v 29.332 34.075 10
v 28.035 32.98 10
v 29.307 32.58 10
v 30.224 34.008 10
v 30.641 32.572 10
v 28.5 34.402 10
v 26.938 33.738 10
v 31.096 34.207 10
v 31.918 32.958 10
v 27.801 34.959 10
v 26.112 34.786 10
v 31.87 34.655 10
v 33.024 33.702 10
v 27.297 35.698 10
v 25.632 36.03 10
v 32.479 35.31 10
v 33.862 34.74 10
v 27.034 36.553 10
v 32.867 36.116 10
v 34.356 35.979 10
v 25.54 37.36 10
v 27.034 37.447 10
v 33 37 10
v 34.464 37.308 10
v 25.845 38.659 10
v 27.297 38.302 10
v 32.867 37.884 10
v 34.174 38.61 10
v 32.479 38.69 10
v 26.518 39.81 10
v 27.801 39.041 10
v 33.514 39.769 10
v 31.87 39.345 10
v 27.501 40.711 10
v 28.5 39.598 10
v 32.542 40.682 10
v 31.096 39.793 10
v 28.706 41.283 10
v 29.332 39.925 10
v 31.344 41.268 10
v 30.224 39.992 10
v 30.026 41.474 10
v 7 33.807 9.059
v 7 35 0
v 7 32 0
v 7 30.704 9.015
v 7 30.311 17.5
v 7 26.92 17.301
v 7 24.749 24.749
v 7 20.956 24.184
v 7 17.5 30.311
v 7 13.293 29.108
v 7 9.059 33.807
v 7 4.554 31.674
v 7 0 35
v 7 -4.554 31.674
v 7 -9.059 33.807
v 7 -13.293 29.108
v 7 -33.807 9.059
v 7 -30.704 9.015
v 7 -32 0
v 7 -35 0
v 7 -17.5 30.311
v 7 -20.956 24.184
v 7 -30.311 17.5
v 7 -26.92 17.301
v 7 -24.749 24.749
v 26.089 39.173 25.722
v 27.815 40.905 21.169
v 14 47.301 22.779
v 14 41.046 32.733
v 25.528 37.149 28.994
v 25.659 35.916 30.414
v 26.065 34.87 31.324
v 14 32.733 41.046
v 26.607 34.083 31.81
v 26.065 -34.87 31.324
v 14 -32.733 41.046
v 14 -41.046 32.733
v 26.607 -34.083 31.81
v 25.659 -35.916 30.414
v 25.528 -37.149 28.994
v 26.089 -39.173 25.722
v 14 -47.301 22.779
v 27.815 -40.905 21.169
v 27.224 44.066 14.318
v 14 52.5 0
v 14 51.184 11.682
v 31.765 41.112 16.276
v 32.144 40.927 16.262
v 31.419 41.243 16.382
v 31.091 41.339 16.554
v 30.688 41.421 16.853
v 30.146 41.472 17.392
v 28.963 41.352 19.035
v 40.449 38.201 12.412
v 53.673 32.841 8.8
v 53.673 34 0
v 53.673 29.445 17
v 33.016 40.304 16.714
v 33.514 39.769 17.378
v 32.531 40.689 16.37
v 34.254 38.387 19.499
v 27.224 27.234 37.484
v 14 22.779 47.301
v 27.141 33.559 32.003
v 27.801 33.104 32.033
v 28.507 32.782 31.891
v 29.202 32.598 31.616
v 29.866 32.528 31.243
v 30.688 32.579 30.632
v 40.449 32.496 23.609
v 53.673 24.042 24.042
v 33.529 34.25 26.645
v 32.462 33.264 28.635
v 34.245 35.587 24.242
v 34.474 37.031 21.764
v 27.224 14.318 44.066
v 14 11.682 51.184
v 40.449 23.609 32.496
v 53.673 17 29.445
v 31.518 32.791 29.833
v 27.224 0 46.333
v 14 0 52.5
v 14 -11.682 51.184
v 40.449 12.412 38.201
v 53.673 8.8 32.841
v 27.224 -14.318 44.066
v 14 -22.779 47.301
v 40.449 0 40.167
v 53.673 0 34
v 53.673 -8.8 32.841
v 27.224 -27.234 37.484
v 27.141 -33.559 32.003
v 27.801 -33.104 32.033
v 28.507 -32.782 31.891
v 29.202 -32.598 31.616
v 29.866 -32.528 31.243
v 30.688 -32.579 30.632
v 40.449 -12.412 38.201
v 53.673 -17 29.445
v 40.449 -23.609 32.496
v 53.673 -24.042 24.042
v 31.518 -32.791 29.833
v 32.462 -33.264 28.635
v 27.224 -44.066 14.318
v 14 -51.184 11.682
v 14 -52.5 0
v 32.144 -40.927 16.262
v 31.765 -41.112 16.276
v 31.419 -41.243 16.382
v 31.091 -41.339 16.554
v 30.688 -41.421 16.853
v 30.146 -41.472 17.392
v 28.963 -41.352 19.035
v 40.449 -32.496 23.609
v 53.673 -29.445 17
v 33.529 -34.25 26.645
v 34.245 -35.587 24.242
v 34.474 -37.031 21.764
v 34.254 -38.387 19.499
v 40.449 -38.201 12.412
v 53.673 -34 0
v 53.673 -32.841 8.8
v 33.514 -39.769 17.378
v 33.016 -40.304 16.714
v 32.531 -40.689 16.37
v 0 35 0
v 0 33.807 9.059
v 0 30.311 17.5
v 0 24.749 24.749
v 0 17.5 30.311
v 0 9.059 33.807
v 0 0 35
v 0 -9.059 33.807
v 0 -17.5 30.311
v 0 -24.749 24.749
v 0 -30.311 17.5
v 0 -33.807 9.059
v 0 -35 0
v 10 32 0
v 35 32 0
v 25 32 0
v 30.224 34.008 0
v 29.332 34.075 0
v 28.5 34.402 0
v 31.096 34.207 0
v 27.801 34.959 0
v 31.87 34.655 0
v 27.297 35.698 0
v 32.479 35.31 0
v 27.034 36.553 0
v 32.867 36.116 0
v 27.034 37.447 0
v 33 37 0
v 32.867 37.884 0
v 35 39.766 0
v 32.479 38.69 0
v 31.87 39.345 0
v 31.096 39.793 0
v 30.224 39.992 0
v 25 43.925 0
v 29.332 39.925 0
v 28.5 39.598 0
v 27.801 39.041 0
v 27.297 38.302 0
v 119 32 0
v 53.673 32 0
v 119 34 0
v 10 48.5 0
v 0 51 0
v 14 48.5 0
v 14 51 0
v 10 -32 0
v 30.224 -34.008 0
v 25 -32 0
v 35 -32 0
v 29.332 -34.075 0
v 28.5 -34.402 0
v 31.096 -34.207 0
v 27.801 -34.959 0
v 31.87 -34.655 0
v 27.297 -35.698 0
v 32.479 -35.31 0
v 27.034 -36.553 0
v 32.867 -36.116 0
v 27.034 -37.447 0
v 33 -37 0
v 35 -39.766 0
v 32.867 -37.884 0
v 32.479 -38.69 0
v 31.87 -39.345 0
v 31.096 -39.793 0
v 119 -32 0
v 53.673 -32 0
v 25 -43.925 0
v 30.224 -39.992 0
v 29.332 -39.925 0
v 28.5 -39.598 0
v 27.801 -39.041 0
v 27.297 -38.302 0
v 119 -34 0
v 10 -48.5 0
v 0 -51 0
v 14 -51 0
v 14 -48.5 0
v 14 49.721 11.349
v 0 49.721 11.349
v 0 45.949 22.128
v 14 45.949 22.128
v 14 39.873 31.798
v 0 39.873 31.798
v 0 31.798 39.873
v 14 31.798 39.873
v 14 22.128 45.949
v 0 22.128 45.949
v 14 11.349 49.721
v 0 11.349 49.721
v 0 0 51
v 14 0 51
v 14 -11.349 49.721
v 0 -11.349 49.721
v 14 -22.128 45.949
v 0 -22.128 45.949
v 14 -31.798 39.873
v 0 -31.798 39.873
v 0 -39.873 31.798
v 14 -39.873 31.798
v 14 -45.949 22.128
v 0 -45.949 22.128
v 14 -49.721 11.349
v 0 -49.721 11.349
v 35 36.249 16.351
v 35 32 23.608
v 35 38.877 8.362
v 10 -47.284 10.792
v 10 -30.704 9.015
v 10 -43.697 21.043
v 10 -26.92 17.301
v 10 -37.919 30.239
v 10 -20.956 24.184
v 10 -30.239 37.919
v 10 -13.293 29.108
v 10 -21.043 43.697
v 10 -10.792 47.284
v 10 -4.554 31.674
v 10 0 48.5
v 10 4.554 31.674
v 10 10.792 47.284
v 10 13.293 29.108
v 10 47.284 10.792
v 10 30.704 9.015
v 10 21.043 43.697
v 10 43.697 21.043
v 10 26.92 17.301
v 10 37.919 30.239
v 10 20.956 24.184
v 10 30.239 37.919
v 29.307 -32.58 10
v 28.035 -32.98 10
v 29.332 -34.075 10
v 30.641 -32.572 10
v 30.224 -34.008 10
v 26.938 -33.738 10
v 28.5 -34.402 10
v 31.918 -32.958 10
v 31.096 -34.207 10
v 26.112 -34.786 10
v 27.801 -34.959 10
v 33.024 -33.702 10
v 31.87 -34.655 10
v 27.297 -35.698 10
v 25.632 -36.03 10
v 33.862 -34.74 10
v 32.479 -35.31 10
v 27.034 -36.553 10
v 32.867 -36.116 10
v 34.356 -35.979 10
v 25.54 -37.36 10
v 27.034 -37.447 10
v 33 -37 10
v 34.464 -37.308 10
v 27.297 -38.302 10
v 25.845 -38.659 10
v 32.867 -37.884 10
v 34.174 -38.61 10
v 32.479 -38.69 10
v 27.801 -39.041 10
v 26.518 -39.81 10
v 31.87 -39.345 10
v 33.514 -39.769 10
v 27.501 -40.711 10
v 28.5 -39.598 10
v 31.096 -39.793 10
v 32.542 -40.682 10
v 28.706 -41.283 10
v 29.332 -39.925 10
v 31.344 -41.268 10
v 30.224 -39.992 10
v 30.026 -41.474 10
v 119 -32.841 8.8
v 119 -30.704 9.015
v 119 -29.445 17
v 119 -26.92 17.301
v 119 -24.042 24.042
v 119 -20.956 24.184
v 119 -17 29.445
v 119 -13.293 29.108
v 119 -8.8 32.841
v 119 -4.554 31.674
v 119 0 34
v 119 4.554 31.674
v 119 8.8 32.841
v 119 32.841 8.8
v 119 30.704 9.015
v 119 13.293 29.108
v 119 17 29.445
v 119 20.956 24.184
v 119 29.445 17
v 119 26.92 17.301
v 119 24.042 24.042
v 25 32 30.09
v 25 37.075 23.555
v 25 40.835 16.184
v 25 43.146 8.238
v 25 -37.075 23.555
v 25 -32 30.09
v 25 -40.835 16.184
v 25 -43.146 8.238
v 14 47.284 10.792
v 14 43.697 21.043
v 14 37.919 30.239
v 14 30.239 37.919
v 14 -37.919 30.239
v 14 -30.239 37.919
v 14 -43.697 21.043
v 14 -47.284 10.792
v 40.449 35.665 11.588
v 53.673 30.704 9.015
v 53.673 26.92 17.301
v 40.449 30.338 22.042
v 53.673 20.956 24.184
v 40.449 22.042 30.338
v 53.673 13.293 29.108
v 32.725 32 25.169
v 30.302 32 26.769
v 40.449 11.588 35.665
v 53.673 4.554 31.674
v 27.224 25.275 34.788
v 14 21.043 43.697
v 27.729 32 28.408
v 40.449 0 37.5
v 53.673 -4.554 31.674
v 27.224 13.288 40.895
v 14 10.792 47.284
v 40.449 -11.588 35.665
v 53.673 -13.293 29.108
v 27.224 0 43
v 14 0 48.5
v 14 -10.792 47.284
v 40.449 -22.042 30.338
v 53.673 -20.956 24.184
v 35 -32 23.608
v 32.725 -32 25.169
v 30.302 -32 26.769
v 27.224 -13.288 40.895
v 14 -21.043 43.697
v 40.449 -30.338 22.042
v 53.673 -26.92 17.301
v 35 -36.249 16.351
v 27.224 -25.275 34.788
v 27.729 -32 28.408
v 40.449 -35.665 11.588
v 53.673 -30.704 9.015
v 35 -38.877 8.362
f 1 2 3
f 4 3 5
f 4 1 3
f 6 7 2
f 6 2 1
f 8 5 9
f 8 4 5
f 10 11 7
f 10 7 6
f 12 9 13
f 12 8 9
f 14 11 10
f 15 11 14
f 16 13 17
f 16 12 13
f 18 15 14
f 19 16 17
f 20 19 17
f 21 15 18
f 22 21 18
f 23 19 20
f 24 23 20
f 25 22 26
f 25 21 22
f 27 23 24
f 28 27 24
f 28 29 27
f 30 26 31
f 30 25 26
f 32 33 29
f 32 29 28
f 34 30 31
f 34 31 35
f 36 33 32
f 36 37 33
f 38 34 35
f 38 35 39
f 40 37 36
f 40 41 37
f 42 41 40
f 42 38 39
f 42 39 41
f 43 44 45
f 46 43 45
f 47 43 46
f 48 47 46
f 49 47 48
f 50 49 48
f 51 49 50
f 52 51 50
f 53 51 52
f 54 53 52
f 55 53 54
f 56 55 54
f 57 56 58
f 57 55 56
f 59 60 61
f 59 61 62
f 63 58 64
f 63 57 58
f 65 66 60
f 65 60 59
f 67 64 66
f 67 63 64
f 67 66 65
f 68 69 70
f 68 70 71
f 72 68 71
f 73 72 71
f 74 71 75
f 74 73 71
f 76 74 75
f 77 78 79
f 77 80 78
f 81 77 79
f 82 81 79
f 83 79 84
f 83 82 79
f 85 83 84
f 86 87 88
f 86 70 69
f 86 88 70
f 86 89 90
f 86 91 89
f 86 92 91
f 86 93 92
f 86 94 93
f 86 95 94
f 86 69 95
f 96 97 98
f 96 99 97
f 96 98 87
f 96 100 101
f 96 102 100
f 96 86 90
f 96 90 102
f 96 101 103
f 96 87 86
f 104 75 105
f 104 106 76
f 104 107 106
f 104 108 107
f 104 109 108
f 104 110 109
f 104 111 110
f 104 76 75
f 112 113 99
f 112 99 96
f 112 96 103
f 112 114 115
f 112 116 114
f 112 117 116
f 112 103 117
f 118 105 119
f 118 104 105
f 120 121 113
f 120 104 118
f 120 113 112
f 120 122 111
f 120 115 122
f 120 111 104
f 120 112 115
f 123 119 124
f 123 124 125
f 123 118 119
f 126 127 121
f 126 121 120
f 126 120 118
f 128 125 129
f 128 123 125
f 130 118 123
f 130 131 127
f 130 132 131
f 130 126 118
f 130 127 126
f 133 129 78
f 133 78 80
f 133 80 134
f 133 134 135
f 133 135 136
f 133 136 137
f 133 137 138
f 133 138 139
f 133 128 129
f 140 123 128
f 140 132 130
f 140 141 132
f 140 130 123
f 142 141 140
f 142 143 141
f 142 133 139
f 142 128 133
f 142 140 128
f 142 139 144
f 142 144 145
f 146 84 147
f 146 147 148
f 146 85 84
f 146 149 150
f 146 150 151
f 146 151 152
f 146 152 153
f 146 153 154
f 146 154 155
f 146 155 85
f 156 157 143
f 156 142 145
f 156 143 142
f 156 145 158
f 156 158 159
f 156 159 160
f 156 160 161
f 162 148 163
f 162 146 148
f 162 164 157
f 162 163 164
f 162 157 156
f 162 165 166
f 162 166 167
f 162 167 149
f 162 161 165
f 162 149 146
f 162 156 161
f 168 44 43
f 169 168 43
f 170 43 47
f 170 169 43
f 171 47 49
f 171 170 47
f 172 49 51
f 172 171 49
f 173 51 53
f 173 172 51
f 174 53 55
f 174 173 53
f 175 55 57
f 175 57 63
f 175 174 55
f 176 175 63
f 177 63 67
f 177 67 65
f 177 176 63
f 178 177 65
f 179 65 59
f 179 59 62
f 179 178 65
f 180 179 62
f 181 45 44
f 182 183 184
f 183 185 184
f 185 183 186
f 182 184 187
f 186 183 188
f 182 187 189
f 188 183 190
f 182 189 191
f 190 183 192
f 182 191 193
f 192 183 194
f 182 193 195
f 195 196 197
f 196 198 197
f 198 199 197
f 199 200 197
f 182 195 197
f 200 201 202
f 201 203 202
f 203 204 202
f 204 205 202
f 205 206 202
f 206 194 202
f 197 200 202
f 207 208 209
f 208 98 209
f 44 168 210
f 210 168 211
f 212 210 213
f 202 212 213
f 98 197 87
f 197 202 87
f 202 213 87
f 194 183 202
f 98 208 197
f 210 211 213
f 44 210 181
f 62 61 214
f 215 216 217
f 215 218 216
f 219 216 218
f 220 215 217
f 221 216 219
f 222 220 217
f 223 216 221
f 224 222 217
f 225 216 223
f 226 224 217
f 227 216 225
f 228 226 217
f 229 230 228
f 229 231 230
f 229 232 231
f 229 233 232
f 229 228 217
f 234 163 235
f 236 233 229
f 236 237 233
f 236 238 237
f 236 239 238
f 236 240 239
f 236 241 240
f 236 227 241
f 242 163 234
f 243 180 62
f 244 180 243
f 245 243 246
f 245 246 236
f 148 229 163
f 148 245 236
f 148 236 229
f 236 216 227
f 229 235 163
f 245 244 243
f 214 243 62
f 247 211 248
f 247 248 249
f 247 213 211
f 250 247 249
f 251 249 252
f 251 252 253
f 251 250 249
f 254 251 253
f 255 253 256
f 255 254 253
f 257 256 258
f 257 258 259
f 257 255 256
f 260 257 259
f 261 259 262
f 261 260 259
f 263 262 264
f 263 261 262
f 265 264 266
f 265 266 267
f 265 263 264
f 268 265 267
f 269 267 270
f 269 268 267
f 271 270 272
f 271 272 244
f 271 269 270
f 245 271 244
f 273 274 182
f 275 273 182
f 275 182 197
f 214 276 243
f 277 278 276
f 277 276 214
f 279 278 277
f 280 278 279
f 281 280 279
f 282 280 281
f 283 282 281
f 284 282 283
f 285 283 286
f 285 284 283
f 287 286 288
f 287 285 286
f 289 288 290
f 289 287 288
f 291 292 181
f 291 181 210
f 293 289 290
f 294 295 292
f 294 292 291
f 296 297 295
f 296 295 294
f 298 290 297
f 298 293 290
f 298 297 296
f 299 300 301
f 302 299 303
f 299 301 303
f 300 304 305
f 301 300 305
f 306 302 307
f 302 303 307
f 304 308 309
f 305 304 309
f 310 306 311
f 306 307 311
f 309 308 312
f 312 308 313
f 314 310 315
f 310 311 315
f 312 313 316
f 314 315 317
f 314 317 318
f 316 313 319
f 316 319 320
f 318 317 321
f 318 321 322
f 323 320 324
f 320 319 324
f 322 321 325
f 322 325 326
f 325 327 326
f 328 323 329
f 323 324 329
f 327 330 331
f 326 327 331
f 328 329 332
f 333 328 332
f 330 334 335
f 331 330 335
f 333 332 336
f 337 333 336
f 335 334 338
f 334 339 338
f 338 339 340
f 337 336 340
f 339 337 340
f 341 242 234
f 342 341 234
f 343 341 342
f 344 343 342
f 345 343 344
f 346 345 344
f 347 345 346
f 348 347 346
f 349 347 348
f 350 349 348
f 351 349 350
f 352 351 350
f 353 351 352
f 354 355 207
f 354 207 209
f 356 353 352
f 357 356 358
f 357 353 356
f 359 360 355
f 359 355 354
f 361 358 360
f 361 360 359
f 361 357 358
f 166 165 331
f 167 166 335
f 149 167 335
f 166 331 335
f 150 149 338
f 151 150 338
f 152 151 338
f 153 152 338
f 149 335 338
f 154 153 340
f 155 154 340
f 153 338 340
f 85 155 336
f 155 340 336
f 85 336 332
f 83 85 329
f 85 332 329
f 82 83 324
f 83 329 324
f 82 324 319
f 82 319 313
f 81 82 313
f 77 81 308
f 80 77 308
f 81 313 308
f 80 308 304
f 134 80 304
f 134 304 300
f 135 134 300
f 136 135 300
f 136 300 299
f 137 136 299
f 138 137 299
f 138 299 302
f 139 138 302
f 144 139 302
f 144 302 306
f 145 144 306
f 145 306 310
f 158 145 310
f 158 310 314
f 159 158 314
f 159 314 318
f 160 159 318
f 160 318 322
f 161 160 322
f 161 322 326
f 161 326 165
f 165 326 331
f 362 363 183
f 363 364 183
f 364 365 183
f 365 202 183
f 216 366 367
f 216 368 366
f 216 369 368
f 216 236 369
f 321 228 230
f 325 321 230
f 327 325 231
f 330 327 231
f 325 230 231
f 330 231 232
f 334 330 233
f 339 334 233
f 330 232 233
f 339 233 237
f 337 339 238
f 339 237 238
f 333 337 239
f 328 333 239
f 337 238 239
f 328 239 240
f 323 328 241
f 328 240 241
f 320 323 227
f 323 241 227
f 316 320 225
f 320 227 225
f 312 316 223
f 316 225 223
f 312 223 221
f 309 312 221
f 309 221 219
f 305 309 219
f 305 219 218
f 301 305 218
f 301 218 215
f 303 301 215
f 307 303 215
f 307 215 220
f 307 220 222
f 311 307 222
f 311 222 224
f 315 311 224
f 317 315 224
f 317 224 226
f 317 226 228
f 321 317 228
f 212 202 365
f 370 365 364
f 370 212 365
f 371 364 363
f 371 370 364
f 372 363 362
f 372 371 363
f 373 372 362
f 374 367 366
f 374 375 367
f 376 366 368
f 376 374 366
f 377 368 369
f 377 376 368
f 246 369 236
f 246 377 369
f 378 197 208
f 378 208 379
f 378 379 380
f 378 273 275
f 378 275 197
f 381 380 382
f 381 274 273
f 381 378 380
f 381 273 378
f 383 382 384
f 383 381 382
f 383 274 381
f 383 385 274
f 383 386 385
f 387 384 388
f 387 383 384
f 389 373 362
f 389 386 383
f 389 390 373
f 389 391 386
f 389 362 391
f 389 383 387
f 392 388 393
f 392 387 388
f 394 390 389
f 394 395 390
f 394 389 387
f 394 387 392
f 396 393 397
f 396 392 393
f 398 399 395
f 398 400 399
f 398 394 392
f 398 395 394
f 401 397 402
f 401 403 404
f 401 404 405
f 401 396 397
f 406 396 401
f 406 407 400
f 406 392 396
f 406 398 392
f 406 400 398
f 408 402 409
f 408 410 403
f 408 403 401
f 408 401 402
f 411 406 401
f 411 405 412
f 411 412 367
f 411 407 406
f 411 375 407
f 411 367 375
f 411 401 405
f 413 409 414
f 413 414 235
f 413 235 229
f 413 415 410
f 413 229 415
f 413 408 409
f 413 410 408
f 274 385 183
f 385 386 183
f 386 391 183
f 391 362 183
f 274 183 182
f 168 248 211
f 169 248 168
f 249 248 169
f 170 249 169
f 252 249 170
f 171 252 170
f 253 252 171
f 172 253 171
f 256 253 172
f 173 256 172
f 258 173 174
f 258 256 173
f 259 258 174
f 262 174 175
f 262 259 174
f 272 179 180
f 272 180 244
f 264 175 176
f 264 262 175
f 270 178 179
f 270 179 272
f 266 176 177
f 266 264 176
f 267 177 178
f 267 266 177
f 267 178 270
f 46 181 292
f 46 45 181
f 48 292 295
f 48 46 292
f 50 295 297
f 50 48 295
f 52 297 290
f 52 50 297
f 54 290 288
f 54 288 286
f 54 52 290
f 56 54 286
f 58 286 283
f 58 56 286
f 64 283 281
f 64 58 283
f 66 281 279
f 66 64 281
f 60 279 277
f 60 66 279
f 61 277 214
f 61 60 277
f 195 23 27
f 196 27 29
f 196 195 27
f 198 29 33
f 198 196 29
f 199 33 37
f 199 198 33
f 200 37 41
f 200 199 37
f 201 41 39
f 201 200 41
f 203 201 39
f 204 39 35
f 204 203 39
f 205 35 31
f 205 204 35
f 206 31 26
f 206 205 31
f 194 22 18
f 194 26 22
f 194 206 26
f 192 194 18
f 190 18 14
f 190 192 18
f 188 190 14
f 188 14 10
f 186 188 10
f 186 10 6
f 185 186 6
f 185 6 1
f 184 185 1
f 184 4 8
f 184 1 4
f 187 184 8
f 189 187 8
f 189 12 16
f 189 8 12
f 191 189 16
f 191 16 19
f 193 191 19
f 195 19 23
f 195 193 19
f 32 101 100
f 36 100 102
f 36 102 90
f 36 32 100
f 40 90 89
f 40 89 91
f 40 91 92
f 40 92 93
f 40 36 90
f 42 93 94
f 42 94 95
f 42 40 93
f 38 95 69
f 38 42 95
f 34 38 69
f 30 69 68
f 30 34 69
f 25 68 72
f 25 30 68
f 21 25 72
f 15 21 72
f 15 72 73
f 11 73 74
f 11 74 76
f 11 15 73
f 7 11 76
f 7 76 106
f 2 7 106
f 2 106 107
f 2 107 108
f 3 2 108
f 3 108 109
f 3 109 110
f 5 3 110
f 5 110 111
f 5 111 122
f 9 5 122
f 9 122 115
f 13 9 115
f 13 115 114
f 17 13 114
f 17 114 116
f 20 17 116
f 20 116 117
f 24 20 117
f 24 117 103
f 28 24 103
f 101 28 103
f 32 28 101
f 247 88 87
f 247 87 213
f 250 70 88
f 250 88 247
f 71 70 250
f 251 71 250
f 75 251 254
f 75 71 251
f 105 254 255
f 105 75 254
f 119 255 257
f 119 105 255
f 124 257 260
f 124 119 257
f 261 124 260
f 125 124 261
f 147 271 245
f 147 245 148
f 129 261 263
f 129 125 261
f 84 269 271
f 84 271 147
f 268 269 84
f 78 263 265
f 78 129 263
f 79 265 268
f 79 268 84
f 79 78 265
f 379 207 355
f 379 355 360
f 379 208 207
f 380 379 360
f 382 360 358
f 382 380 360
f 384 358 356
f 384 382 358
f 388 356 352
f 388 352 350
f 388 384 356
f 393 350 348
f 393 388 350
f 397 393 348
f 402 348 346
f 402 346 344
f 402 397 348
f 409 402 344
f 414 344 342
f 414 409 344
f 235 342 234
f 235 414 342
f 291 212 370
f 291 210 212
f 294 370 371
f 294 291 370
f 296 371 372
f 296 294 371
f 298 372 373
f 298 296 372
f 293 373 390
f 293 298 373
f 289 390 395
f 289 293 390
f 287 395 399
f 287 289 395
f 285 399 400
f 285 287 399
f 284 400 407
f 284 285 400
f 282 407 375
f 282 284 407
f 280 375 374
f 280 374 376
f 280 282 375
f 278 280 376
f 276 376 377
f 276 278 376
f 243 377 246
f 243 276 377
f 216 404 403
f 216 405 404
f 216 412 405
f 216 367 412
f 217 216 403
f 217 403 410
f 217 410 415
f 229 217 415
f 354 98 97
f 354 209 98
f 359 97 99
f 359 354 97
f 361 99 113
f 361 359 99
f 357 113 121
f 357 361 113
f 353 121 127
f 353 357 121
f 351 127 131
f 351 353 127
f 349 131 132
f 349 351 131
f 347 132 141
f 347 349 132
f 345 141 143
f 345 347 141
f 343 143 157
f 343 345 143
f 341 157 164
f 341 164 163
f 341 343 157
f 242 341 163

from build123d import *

# Parameters (mm, degrees)
REVOLVE_2_ANGLE     = 180
EXTRUDE_3_REACH     = 142.262
SKETCH_1_12_R       = 4.474143501
CUT_EXTRUDE_3_DEPTH = 204.9
SKETCH_1_14_R       = 4.474143501
EXTRUDE_4_DEPTH     = 10
SKETCH_1_16_R       = 3
CUT_EXTRUDE_4_DEPTH = 32


with BuildPart() as part:
    # Эскиз1 → Повернуть2 (revolve)
    with BuildSketch(Plane.XY):
        Polygon((0, 51), (0, 35), (7, 35), (7, 32), (10, 32), (10, 48.5), (14, 48.5), (25, 43.925143786), (31.718111621, 41.131107905), (35, 39.766183592), (53.673378029, 32), (119, 32), (119, 34), (53.673378029, 34), (14, 52.5), (14, 51), align=None)
    revolve(axis=Axis((0, 0, 0), (1, 0, 0)), revolution_arc=REVOLVE_2_ANGLE)

    # Эскиз1<11> → Бобышка-Вытянуть3 (add, up to next)
    with BuildSketch(Plane.XY, mode=Mode.PRIVATE) as extrude_3_sk1:
        Polygon((25, 43.925143786), (25, 32), (35, 32), (35, 39.766183592), align=None)
    extrude_3_tool1 = extrude(extrude_3_sk1.sketch, amount=EXTRUDE_3_REACH, mode=Mode.PRIVATE) - part.part
    extrude_3 = extrude_3_tool1.solids().sort_by_distance((29.647987, 36.996032, 0))[0]
    add(extrude_3)

    # Эскиз1<12> → Вырез-Вытянуть3 (cut)
    with BuildSketch(Plane.XY):
        with Locations((30, 37)):
            Circle(SKETCH_1_12_R)
    cut_extrude_3 = extrude(amount=CUT_EXTRUDE_3_DEPTH, mode=Mode.SUBTRACT)

    # Эскиз1<14> → Бобышка-Вытянуть4 (add)
    with BuildSketch(Plane.XY):
        with Locations((30, 37)):
            Circle(SKETCH_1_14_R)
    extrude_4 = extrude(amount=EXTRUDE_4_DEPTH)

    # Эскиз1<16> → Вырез-Вытянуть4 (cut)
    with BuildSketch(Plane.XY):
        with Locations((30, 37)):
            Circle(SKETCH_1_16_R)
    cut_extrude_4 = extrude(amount=CUT_EXTRUDE_4_DEPTH, mode=Mode.SUBTRACT)

    # Зеркальное отражение1: Бобышка-Вытянуть3, Вырез-Вытянуть3, Бобышка-Вытянуть4, Вырез-Вытянуть4 across plane
    add(extrude_3.mirror(Plane.ZX))
    add(cut_extrude_3.mirror(Plane.ZX), mode=Mode.SUBTRACT)
    add(extrude_4.mirror(Plane.ZX))
    add(cut_extrude_4.mirror(Plane.ZX), mode=Mode.SUBTRACT)


solid = part.part
